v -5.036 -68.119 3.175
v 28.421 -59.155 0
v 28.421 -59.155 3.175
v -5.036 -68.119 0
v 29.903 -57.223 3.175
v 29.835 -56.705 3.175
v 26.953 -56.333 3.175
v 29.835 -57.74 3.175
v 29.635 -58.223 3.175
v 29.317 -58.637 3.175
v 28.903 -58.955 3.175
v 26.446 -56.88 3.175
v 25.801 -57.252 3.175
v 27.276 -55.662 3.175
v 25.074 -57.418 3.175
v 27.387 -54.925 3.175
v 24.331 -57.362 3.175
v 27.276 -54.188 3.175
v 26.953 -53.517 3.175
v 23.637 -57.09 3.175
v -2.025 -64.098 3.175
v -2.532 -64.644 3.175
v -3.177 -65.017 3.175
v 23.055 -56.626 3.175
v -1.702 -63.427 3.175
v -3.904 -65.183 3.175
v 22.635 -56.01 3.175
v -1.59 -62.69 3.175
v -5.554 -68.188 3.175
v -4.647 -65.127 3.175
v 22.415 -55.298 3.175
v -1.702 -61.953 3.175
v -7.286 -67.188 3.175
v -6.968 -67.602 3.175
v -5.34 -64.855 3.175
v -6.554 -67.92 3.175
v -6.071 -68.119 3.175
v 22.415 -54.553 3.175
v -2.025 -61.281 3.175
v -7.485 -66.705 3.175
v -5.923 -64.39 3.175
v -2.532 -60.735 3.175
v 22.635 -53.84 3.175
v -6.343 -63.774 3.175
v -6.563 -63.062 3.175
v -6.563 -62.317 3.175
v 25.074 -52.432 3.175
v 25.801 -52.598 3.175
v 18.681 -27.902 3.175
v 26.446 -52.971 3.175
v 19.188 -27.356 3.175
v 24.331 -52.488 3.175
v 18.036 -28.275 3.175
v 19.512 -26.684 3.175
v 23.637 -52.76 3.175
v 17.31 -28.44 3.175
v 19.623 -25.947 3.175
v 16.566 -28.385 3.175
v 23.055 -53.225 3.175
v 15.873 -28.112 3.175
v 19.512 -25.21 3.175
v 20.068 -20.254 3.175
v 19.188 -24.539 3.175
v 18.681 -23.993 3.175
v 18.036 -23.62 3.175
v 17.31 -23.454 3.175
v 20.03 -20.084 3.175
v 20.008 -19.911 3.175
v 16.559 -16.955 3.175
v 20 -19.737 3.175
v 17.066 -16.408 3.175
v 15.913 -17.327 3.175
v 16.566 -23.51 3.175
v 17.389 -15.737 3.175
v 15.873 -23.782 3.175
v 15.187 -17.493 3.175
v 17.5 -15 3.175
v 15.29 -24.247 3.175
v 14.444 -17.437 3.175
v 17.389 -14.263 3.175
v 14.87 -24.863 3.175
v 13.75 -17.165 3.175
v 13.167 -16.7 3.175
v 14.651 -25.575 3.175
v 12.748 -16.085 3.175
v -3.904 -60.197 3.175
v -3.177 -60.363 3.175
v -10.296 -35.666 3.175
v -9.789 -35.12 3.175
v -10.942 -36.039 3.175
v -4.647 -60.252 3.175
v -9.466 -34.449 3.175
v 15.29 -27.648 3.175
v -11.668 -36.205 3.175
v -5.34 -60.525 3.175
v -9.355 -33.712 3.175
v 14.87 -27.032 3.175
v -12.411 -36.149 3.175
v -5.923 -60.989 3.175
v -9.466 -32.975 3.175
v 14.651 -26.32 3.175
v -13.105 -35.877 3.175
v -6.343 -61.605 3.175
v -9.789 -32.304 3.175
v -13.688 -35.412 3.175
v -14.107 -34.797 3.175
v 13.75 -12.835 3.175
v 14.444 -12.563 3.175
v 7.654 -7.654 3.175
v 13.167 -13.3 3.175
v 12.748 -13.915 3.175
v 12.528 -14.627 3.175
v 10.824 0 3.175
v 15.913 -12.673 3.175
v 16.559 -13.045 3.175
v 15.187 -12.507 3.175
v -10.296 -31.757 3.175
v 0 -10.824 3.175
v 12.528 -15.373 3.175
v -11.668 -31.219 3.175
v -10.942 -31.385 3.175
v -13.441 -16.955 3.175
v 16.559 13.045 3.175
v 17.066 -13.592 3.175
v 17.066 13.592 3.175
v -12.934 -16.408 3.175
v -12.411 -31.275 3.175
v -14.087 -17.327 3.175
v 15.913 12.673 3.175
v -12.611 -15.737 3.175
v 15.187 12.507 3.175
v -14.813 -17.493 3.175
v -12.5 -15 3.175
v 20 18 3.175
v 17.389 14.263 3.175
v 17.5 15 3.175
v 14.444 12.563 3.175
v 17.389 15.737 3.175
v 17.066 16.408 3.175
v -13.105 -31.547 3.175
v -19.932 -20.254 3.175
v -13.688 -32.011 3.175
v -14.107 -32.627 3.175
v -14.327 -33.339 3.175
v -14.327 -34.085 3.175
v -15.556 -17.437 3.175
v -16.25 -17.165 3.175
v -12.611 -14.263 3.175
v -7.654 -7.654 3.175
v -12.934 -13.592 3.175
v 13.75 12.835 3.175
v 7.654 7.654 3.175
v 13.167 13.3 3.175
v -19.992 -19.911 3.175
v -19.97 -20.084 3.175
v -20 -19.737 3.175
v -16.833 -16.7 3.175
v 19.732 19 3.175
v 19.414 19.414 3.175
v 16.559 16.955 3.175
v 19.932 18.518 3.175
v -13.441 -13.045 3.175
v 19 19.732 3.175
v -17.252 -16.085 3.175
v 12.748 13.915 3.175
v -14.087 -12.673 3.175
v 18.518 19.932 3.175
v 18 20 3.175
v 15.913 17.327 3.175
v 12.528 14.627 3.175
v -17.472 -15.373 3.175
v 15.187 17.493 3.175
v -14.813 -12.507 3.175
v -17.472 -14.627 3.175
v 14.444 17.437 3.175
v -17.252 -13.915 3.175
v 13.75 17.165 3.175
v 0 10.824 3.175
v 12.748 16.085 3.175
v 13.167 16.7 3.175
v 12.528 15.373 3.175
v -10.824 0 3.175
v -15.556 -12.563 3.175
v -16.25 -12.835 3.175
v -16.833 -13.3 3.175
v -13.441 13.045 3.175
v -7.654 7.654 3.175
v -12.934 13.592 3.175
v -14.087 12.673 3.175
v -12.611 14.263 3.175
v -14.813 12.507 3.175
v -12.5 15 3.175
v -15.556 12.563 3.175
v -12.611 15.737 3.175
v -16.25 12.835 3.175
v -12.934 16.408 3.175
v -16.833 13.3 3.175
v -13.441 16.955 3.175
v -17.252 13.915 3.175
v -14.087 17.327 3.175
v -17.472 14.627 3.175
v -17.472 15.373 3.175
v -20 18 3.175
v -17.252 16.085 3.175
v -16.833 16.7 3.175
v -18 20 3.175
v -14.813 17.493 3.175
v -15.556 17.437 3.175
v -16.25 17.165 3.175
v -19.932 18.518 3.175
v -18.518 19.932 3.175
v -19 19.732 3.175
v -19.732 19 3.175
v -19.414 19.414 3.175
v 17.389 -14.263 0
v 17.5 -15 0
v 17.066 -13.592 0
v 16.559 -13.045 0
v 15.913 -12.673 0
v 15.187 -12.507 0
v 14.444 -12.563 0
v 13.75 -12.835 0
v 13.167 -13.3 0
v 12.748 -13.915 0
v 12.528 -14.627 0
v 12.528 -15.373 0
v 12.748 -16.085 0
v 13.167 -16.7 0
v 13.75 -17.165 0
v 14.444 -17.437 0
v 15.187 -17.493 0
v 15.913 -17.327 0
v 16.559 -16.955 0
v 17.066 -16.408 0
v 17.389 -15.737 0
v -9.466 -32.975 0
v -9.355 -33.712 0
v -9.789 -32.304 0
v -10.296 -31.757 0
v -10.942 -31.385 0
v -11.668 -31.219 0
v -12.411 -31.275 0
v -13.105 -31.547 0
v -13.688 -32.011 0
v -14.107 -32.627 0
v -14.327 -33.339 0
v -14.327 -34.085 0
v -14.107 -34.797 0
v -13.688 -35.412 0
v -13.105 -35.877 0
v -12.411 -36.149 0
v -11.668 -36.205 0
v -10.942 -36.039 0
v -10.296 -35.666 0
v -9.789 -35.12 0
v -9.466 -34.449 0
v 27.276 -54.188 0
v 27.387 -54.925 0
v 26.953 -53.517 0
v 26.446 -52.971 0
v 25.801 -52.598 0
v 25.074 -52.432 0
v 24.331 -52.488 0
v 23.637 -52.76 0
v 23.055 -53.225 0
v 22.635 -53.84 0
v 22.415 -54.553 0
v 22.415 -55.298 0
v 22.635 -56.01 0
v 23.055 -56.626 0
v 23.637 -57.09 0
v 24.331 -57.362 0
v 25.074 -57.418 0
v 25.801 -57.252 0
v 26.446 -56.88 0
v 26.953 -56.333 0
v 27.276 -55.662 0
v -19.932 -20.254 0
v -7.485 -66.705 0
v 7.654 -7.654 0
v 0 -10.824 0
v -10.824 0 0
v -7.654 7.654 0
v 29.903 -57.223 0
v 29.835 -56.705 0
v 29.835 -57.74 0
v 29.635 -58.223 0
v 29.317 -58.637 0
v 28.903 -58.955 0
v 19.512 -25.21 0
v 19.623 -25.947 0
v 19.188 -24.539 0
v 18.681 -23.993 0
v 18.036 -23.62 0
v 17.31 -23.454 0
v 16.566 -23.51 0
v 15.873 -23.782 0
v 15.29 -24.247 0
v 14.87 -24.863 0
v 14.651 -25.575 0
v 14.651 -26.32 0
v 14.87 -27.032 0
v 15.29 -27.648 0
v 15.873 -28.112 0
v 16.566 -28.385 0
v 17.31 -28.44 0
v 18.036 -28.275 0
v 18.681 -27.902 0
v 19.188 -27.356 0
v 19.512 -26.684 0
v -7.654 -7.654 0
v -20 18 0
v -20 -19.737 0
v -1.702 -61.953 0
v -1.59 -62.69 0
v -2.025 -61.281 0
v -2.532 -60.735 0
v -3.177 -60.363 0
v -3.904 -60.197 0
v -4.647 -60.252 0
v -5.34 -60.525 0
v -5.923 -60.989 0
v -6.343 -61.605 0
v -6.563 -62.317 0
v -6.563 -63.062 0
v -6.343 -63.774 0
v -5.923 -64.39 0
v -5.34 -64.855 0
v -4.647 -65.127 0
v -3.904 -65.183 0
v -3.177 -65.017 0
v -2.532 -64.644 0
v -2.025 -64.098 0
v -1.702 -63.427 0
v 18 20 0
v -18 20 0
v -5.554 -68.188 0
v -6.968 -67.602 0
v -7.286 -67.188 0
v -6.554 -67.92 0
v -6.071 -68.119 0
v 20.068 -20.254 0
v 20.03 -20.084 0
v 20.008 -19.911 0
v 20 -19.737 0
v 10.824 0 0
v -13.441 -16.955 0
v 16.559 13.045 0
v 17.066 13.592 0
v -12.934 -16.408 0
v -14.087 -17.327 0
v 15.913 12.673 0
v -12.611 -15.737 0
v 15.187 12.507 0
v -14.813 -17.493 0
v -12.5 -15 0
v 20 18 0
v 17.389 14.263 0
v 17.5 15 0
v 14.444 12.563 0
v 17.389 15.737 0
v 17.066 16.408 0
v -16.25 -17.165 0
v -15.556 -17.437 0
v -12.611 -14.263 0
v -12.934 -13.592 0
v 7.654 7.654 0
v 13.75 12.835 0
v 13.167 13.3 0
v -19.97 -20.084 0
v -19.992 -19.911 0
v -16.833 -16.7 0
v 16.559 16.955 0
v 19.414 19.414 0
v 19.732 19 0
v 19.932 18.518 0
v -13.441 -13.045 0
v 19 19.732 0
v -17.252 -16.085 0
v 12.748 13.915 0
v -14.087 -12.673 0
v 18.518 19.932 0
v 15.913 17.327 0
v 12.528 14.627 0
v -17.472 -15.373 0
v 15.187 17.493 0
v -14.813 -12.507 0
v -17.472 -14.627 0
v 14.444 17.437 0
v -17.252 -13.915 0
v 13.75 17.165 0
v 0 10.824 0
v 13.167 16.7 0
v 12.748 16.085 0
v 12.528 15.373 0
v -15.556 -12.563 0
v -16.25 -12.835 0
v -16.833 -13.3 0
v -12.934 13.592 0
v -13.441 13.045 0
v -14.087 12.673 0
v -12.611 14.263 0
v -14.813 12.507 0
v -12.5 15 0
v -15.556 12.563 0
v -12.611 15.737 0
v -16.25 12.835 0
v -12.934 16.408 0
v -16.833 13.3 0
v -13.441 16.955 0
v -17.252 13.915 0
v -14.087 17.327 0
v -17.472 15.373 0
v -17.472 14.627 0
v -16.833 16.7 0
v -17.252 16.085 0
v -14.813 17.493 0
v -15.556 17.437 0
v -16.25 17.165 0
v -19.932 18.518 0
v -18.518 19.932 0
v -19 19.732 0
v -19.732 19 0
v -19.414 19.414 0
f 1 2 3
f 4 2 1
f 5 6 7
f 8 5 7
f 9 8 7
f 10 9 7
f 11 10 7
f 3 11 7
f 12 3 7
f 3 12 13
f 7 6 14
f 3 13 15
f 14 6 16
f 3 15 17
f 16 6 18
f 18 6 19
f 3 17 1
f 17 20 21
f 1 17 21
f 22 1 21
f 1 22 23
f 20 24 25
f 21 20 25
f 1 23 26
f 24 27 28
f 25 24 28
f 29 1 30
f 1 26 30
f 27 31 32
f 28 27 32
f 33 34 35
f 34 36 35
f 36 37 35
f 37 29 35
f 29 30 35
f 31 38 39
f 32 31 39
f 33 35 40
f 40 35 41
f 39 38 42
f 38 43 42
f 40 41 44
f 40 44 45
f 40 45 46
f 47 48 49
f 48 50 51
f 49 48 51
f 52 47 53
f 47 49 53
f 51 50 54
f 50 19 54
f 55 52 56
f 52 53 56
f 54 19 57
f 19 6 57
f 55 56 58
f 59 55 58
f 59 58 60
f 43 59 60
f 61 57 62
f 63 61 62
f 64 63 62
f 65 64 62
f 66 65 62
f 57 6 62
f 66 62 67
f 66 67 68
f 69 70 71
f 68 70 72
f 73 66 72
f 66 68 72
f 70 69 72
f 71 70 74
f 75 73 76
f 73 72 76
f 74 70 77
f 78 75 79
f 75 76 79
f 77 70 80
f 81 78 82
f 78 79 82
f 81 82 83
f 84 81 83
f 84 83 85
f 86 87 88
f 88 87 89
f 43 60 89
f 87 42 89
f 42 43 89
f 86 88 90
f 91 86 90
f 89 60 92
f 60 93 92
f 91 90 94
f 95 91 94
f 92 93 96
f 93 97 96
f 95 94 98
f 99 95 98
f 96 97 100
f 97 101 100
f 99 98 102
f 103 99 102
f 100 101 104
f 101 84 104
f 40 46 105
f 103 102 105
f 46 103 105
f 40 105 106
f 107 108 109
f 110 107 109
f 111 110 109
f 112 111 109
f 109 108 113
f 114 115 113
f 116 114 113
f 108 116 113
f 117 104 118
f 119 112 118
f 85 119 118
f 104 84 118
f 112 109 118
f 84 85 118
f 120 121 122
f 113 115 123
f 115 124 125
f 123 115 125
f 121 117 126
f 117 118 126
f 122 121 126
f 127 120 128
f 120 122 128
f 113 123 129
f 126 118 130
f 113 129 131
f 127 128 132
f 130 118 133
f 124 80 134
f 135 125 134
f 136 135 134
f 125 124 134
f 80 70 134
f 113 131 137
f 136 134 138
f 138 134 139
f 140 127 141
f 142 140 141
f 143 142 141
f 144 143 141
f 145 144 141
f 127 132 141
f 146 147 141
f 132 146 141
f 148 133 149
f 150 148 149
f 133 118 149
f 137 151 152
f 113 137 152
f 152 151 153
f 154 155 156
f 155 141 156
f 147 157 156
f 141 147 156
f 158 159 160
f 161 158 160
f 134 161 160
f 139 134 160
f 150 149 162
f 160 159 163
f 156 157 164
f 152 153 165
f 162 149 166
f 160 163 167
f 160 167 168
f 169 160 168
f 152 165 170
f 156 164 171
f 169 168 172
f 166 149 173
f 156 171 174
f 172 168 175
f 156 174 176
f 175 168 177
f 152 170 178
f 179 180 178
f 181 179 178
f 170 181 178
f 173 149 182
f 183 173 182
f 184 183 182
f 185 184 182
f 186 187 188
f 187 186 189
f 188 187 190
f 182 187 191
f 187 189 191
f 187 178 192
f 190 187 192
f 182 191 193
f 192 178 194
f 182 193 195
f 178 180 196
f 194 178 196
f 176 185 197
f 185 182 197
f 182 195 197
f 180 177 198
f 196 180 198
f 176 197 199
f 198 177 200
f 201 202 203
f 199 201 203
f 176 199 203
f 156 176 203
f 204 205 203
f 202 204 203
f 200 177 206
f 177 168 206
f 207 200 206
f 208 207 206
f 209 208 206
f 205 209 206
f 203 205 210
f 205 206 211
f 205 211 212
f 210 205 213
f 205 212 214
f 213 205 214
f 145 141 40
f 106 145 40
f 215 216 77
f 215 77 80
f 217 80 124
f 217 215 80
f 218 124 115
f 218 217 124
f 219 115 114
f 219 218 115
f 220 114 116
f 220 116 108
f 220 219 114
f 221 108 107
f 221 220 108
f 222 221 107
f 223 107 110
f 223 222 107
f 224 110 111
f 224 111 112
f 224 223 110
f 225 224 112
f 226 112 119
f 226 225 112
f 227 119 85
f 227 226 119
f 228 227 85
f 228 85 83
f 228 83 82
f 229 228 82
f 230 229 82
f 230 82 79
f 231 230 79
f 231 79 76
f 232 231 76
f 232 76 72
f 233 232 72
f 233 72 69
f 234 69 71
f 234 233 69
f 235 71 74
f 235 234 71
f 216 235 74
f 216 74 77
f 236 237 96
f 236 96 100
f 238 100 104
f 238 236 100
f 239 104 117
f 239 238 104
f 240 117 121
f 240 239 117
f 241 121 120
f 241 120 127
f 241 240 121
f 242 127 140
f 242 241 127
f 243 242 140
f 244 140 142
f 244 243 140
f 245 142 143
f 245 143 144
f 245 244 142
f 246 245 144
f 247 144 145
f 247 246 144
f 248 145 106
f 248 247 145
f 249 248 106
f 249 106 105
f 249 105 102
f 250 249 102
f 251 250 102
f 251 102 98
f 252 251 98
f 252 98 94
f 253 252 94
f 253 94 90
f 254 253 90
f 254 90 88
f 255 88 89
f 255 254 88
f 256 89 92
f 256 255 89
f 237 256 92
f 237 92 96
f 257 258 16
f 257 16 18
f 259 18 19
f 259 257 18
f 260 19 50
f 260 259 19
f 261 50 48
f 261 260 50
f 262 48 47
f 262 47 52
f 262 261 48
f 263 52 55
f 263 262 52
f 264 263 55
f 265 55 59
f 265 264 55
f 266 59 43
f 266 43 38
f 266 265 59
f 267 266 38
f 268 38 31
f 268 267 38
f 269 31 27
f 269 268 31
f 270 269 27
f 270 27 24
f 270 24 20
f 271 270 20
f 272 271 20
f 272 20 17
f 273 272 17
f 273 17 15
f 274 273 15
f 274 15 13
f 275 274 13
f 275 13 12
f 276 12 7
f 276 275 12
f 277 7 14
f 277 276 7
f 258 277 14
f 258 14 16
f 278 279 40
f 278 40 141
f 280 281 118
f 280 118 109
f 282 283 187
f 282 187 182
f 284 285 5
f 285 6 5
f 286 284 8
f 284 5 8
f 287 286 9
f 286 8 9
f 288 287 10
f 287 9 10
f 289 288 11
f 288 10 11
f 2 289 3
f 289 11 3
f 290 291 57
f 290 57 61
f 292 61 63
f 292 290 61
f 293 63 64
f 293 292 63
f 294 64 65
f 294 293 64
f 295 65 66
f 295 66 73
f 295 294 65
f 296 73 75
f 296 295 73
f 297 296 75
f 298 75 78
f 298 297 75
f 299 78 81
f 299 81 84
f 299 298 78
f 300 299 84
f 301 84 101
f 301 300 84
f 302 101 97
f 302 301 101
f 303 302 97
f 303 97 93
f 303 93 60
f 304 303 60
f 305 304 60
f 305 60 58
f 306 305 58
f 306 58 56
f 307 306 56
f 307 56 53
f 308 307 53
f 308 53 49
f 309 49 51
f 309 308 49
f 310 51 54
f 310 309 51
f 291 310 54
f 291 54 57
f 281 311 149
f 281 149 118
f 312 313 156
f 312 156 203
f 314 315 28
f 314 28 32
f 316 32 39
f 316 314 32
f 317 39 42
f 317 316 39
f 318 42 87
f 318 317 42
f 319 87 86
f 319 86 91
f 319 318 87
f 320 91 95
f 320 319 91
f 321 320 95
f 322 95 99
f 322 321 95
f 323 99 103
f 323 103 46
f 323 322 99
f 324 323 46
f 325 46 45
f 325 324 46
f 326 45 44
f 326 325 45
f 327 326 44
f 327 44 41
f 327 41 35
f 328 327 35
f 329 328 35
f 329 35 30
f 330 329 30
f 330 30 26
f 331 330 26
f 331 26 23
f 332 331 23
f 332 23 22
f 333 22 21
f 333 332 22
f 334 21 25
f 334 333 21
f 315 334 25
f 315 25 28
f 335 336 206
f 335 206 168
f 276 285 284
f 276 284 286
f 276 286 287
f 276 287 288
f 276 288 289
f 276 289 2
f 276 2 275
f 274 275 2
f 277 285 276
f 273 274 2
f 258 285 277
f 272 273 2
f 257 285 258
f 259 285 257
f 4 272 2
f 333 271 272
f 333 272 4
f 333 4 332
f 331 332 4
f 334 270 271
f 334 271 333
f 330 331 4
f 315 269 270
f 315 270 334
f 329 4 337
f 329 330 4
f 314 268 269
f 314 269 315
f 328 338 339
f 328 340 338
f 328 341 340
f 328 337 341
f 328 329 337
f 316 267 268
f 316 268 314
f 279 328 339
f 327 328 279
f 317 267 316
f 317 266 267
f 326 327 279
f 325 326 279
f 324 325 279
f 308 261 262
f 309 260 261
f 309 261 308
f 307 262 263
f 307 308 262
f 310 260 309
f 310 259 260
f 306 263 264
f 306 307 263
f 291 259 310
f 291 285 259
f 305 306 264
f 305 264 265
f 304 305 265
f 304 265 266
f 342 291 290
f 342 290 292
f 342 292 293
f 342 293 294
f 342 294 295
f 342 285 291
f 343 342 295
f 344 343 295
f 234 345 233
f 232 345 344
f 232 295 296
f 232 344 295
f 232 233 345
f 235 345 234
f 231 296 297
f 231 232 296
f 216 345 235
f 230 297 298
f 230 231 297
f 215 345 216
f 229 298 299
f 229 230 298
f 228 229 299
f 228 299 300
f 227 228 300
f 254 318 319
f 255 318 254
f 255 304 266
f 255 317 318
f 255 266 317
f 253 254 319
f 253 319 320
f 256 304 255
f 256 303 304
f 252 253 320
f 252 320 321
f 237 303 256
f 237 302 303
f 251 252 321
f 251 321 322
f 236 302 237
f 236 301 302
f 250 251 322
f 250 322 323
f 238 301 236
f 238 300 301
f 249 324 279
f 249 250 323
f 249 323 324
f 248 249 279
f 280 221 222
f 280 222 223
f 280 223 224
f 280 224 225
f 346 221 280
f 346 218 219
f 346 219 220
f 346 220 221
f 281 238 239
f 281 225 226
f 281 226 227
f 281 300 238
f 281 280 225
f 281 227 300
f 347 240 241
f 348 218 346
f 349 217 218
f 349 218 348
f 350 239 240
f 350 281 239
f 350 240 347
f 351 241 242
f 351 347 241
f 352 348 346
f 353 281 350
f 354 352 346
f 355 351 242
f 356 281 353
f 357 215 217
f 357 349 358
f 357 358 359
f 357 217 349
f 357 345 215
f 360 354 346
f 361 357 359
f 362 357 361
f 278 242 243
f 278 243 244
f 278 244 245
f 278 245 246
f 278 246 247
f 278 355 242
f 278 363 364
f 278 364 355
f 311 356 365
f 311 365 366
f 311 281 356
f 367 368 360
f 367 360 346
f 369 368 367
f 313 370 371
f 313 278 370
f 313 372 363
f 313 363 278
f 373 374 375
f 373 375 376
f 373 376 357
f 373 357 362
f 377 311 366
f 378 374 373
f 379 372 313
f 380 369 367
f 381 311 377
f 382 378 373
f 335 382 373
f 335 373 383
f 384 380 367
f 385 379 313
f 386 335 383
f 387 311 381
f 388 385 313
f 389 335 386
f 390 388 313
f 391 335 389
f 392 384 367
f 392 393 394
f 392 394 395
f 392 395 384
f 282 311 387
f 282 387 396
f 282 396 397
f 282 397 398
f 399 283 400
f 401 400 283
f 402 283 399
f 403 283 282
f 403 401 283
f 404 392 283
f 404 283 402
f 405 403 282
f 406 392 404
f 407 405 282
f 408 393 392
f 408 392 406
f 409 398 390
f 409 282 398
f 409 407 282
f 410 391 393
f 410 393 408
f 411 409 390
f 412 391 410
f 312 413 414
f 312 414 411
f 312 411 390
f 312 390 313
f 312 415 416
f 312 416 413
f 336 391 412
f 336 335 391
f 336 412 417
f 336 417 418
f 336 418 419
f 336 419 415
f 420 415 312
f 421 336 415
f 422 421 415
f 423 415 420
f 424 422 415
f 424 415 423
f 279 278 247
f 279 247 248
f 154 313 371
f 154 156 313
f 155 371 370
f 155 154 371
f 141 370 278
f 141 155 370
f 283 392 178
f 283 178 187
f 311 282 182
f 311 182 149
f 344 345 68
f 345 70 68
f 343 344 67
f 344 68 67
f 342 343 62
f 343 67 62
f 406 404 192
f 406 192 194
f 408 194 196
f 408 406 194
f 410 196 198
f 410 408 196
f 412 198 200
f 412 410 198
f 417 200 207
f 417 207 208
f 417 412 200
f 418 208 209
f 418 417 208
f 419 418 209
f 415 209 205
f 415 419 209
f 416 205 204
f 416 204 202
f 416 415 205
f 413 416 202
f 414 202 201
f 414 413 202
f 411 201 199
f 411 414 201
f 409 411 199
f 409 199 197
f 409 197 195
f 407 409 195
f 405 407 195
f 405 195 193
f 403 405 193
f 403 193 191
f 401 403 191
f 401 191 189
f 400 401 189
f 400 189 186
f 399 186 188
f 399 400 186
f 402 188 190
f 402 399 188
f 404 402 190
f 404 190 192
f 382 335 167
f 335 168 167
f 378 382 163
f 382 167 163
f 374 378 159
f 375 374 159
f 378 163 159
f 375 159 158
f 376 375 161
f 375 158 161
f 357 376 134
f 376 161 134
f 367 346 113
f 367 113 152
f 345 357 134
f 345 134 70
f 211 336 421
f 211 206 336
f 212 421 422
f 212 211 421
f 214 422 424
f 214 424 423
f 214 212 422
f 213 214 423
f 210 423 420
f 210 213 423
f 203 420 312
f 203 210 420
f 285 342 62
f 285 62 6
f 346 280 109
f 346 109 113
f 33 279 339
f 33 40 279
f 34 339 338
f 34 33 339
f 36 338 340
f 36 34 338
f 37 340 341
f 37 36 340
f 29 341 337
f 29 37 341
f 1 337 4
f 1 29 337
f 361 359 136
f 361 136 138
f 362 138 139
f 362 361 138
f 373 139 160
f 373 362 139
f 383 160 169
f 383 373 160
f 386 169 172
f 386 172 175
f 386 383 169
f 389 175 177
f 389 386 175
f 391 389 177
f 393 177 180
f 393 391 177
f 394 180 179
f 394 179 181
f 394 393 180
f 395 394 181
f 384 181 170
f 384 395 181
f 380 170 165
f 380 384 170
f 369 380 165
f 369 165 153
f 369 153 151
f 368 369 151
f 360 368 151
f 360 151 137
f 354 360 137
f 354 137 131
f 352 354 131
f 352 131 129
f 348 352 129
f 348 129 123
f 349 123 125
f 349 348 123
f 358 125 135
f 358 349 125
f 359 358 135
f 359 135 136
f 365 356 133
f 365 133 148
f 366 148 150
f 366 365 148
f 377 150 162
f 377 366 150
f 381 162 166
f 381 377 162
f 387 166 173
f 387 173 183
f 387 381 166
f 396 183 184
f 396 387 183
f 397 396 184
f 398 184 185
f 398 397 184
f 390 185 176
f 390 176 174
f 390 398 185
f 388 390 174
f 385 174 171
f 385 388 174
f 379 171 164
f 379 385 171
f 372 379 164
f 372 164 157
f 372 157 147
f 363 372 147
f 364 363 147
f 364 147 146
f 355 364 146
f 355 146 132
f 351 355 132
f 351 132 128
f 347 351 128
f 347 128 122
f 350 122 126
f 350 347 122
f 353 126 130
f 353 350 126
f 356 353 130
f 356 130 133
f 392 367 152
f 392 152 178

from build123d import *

# Parameters (mm, degrees)
SKETCH1_R           = 2.5
BOSS_EXTRUDE1_DEPTH = 3.175
FILLET1_R           = 2


with BuildPart() as part:
    # Sketch1 → Boss-Extrude1 (new body)
    with BuildSketch(Plane.XY):
        Polygon((-20, 20), (20, 20), (20, -20), (30.352761804, -58.637033052), (-6.967746272, -68.637033052), (-20, -20), align=None)
        with Locations((-15, 15)):
            Circle(SKETCH1_R, mode=Mode.SUBTRACT)
        with Locations((-15, -15)):
            Circle(SKETCH1_R, mode=Mode.SUBTRACT)
        with Locations((15, 15)):
            Circle(SKETCH1_R, mode=Mode.SUBTRACT)
        with Locations((15, -15)):
            Circle(SKETCH1_R, mode=Mode.SUBTRACT)
        with Locations((-11.855046207, -33.711914808)):
            Circle(SKETCH1_R, mode=Mode.SUBTRACT)
        with Locations((17.122728582, -25.947343455)):
            Circle(SKETCH1_R, mode=Mode.SUBTRACT)
        with Locations((24.887299935, -54.925118244)):
            Circle(SKETCH1_R, mode=Mode.SUBTRACT)
        with Locations((-4.090474854, -62.689689597)):
            Circle(SKETCH1_R, mode=Mode.SUBTRACT)
        Polygon((10.823922003, 0), (7.653668647, 7.653668647), (0, 10.823922003), (-7.653668647, 7.653668647), (-10.823922003, 0), (-7.653668647, -7.653668647), (0, -10.823922003), (7.653668647, -7.653668647), align=None, mode=Mode.SUBTRACT)
    extrude(amount=BOSS_EXTRUDE1_DEPTH)

    # Fillet1
    fillet1_edges = [part.edges().sort_by_distance(p)[0] for p in [
        (-20, 20, 1.5875),
        (20, 20, 1.5875),
        (20, -20, 1.5875),
        (30.352761804, -58.637033052, 1.5875),
        (-6.967746272, -68.637033052, 1.5875),
        (-20, -20, 1.5875),
    ]]
    fillet(fillet1_edges, radius=FILLET1_R)


solid = part.part
